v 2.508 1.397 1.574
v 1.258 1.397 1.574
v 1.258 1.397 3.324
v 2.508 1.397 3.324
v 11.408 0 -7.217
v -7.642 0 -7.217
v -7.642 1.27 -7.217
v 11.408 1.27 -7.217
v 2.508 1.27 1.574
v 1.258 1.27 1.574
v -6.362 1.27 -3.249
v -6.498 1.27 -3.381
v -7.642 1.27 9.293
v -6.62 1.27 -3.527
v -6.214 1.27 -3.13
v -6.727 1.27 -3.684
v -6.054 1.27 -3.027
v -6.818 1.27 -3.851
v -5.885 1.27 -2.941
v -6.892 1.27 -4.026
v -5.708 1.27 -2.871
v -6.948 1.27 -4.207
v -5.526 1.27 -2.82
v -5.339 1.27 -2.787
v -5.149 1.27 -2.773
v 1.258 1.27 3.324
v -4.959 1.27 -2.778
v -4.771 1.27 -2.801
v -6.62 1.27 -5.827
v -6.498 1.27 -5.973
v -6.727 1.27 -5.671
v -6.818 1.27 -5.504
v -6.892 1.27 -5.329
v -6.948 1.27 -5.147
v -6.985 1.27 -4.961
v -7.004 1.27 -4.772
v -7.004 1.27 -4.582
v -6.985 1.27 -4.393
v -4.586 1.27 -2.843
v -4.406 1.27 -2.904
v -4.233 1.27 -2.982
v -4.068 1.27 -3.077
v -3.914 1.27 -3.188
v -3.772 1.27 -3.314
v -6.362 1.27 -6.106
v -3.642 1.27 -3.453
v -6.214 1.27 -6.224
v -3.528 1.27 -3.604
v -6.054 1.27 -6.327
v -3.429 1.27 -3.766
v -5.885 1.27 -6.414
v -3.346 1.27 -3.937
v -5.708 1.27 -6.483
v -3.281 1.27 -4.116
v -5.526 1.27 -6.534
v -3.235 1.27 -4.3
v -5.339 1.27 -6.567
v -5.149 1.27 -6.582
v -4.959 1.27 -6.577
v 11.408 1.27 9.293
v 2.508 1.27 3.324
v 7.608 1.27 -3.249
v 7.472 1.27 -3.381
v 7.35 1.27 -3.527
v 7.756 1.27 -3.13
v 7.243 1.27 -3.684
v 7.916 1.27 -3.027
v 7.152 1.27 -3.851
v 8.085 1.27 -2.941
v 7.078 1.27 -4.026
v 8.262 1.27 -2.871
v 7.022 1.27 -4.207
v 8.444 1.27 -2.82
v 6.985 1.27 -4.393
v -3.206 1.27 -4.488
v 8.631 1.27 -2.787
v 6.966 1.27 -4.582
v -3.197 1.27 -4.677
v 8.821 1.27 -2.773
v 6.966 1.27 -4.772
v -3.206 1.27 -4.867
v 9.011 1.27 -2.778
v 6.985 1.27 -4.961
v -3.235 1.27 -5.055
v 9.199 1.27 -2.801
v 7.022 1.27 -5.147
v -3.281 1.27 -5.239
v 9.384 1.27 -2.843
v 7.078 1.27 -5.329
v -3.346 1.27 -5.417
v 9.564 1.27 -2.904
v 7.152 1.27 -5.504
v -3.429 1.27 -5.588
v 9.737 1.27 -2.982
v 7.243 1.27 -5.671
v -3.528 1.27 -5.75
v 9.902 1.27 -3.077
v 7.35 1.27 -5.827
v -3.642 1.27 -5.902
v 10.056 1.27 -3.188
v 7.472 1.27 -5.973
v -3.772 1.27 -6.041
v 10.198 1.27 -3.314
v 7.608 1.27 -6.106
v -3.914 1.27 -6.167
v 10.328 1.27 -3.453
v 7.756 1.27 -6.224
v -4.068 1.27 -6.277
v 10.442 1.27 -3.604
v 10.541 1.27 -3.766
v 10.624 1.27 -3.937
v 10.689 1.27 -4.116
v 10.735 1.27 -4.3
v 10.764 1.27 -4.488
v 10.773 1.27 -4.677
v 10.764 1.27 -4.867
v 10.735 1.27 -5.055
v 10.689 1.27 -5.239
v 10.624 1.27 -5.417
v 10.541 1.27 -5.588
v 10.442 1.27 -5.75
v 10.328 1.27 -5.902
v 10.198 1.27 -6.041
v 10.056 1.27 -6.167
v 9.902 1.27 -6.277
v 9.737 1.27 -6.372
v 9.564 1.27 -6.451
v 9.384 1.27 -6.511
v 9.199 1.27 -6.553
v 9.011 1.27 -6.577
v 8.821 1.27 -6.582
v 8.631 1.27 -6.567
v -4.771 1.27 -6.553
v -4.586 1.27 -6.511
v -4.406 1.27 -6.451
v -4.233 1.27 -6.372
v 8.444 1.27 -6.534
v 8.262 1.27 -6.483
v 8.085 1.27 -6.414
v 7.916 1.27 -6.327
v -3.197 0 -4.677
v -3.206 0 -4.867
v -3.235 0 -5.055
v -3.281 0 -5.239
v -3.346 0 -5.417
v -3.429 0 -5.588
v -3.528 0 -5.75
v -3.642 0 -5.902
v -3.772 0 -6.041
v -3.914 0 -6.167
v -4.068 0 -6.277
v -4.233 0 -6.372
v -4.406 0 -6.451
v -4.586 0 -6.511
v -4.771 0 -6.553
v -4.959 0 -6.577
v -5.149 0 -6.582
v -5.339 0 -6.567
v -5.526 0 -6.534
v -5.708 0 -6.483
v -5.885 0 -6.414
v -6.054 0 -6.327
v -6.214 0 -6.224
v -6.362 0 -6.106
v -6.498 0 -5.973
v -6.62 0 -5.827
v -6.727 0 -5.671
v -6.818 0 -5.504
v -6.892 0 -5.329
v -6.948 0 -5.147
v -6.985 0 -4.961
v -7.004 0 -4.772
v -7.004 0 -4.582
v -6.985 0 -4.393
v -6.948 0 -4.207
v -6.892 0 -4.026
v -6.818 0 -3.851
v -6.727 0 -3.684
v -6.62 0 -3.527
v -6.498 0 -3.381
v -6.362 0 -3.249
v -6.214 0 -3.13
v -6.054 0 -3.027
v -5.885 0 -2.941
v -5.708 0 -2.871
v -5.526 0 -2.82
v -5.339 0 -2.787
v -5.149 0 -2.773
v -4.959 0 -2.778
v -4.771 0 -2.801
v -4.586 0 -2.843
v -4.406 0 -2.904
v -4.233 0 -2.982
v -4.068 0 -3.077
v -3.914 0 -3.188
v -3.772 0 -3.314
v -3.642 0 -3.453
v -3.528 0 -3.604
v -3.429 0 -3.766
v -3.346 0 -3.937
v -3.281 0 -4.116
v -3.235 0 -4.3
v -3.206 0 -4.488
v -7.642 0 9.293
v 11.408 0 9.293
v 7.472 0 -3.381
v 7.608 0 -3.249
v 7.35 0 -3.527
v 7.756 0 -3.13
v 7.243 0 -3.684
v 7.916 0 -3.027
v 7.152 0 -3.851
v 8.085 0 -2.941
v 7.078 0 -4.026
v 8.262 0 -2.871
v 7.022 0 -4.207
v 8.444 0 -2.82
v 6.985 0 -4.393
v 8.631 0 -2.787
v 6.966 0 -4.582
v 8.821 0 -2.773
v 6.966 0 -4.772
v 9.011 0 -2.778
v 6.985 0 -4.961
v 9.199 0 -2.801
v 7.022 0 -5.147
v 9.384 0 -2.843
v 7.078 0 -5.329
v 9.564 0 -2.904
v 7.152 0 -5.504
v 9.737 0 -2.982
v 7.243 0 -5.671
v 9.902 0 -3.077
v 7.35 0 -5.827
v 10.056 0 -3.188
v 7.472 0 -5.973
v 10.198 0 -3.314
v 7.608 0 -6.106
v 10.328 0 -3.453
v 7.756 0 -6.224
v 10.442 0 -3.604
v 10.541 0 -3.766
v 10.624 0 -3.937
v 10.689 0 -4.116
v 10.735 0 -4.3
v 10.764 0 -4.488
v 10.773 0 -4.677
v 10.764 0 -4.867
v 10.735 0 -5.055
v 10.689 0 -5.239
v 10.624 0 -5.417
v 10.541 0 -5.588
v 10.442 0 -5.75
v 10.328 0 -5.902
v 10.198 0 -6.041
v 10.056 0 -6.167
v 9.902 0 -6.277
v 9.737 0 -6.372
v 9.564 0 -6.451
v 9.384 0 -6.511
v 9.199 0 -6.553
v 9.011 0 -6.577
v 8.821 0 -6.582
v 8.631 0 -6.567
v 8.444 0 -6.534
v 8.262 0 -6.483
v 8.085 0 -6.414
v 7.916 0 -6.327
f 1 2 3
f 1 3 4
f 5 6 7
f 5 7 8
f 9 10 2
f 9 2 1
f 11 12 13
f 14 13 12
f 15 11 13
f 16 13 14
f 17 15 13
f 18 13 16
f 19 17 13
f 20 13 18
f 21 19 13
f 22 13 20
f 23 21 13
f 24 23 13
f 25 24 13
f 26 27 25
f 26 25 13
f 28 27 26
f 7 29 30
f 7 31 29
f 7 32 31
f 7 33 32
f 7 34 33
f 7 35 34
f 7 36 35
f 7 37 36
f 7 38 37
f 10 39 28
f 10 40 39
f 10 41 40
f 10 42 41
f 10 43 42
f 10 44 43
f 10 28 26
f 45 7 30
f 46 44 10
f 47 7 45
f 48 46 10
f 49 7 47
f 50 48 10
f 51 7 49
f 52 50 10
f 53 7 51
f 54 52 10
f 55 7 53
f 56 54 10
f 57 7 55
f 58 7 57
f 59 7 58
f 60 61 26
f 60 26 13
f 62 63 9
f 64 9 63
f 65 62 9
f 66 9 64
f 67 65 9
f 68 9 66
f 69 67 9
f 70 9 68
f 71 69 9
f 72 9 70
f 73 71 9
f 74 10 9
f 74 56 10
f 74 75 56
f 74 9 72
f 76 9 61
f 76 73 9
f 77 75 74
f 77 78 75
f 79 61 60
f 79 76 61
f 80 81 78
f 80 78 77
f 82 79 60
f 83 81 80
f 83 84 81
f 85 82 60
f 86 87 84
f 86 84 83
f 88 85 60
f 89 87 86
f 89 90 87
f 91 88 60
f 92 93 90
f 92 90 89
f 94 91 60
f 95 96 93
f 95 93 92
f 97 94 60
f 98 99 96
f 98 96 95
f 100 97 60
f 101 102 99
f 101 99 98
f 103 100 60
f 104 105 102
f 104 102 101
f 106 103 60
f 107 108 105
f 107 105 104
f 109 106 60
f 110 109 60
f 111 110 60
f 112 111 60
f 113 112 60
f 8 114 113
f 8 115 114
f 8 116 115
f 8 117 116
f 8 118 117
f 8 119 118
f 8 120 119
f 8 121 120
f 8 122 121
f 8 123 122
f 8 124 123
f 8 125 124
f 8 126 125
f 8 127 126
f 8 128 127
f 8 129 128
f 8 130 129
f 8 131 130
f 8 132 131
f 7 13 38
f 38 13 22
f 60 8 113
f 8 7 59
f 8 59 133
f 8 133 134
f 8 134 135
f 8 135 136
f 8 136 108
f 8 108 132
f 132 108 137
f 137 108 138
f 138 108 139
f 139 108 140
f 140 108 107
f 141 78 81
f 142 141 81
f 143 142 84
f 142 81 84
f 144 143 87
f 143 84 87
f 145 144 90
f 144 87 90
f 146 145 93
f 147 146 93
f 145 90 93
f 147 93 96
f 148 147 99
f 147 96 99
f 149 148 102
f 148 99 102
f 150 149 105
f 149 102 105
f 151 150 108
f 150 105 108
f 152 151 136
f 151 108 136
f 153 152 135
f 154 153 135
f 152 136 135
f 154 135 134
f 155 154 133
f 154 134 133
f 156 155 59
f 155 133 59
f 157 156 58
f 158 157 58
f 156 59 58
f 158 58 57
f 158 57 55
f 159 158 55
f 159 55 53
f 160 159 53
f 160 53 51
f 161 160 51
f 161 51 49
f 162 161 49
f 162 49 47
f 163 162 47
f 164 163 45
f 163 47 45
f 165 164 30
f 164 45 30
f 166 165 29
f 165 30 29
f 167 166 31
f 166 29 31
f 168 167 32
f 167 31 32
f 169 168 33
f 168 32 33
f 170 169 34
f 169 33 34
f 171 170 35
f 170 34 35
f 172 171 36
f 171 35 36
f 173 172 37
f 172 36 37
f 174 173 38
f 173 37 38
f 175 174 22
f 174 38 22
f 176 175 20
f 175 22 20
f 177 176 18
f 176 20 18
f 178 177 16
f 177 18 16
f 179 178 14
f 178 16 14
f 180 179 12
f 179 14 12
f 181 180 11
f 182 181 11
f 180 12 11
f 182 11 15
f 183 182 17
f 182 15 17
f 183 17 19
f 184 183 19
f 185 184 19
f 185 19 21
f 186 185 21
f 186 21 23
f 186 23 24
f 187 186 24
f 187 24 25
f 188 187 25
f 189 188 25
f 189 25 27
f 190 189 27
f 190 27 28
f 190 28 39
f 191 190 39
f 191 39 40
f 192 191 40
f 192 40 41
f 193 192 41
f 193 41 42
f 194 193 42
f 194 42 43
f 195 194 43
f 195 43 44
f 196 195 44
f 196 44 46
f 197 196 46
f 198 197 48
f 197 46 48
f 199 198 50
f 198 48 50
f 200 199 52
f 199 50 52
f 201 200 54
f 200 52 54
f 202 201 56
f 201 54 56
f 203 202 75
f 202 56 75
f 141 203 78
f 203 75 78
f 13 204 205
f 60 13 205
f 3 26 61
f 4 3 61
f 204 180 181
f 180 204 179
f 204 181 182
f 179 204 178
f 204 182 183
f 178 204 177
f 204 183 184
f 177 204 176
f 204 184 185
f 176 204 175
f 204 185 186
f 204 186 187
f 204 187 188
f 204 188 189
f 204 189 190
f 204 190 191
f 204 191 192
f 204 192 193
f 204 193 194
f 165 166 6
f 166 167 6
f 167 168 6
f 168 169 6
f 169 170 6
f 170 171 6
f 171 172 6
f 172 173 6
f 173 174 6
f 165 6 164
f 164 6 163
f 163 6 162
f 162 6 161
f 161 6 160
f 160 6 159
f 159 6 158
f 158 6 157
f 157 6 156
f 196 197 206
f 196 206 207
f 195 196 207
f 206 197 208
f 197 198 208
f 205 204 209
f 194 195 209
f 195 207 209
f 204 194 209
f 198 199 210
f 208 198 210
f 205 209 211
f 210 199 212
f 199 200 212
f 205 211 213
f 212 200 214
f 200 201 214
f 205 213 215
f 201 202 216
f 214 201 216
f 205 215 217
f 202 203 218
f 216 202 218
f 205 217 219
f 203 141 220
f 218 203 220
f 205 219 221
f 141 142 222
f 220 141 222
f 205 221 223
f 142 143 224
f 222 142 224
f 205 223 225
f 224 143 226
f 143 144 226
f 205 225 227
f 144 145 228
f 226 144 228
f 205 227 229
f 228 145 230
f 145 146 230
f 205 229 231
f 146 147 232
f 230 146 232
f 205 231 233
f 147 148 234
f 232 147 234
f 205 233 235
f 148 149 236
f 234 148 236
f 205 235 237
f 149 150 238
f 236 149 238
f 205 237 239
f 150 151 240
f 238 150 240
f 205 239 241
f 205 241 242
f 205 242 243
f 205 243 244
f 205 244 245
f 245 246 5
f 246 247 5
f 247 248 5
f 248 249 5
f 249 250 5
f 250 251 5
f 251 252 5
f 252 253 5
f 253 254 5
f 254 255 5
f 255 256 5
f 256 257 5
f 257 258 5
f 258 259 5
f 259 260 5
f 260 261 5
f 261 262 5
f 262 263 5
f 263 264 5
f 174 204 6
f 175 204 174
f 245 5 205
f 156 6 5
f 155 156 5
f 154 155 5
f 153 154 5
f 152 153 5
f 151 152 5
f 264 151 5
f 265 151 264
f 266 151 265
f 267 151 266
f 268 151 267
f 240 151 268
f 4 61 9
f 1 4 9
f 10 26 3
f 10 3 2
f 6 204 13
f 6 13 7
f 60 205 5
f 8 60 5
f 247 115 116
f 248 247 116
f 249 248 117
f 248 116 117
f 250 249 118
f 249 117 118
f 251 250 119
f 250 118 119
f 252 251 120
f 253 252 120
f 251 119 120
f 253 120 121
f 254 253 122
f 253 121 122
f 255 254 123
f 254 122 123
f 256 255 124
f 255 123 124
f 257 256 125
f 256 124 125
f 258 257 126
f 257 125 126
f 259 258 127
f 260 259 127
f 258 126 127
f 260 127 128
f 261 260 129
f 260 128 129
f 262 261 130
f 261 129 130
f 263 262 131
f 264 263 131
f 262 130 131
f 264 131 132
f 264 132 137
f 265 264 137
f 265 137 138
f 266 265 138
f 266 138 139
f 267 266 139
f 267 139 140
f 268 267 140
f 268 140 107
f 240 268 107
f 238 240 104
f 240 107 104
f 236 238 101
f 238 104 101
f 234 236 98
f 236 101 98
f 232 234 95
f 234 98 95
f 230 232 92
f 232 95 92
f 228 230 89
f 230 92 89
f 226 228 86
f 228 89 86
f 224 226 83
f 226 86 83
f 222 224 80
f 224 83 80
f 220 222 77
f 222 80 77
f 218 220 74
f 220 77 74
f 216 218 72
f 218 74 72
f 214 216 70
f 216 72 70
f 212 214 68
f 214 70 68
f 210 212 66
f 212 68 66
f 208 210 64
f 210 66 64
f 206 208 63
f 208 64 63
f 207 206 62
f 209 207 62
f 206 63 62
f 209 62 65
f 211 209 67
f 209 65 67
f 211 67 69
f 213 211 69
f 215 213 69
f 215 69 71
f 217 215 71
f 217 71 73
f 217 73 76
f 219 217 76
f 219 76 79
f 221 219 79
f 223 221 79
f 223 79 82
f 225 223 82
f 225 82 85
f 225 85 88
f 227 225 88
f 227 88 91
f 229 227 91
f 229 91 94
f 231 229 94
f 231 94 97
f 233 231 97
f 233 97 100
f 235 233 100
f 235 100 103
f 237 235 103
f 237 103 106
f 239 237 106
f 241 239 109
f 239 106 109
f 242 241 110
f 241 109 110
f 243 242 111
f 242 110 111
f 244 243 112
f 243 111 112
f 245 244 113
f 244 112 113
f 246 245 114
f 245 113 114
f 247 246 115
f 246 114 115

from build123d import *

# Parameters (mm, degrees)
SKETCH1_W           = 19.05
SKETCH1_H           = 16.51
BOSS_EXTRUDE1_DEPTH = 1.27
SKETCH2_R           = 1.905
CUT_EXTRUDE1_DEPTH  = 1.27
SKETCH3_W           = 1.25000004
SKETCH3_H           = 1.75
BOSS_EXTRUDE2_DEPTH = 0.127


with BuildPart() as part:
    # Sketch1 → Boss-Extrude1 (new body)
    with BuildSketch(Plane(origin=(0, 0, 0), x_dir=(1, 0, 0), z_dir=(0, 1, 0))):
        with Locations((1.883228571, -1.037771429)):
            Rectangle(SKETCH1_W, SKETCH1_H)
    extrude(amount=BOSS_EXTRUDE1_DEPTH)

    # Sketch2 → Cut-Extrude1 (cut)
    with BuildSketch(Plane(origin=(0, 1.27, 0), x_dir=(1, 0, 0), z_dir=(0, 1, 0))):
        with Locations((-5.101771429, 4.677228571)):
            Circle(SKETCH2_R)
        with Locations((8.868228571, 4.677228571)):
            Circle(SKETCH2_R)
    extrude(amount=-CUT_EXTRUDE1_DEPTH, mode=Mode.SUBTRACT)

    # Sketch3 → Boss-Extrude2 (add)
    with BuildSketch(Plane(origin=(0, 1.27, 0), x_dir=(1, 0, 0), z_dir=(0, 1, 0))):
        with Locations((1.883228571, -2.448771429)):
            Rectangle(SKETCH3_W, SKETCH3_H)
    extrude(amount=BOSS_EXTRUDE2_DEPTH)


solid = part.part
